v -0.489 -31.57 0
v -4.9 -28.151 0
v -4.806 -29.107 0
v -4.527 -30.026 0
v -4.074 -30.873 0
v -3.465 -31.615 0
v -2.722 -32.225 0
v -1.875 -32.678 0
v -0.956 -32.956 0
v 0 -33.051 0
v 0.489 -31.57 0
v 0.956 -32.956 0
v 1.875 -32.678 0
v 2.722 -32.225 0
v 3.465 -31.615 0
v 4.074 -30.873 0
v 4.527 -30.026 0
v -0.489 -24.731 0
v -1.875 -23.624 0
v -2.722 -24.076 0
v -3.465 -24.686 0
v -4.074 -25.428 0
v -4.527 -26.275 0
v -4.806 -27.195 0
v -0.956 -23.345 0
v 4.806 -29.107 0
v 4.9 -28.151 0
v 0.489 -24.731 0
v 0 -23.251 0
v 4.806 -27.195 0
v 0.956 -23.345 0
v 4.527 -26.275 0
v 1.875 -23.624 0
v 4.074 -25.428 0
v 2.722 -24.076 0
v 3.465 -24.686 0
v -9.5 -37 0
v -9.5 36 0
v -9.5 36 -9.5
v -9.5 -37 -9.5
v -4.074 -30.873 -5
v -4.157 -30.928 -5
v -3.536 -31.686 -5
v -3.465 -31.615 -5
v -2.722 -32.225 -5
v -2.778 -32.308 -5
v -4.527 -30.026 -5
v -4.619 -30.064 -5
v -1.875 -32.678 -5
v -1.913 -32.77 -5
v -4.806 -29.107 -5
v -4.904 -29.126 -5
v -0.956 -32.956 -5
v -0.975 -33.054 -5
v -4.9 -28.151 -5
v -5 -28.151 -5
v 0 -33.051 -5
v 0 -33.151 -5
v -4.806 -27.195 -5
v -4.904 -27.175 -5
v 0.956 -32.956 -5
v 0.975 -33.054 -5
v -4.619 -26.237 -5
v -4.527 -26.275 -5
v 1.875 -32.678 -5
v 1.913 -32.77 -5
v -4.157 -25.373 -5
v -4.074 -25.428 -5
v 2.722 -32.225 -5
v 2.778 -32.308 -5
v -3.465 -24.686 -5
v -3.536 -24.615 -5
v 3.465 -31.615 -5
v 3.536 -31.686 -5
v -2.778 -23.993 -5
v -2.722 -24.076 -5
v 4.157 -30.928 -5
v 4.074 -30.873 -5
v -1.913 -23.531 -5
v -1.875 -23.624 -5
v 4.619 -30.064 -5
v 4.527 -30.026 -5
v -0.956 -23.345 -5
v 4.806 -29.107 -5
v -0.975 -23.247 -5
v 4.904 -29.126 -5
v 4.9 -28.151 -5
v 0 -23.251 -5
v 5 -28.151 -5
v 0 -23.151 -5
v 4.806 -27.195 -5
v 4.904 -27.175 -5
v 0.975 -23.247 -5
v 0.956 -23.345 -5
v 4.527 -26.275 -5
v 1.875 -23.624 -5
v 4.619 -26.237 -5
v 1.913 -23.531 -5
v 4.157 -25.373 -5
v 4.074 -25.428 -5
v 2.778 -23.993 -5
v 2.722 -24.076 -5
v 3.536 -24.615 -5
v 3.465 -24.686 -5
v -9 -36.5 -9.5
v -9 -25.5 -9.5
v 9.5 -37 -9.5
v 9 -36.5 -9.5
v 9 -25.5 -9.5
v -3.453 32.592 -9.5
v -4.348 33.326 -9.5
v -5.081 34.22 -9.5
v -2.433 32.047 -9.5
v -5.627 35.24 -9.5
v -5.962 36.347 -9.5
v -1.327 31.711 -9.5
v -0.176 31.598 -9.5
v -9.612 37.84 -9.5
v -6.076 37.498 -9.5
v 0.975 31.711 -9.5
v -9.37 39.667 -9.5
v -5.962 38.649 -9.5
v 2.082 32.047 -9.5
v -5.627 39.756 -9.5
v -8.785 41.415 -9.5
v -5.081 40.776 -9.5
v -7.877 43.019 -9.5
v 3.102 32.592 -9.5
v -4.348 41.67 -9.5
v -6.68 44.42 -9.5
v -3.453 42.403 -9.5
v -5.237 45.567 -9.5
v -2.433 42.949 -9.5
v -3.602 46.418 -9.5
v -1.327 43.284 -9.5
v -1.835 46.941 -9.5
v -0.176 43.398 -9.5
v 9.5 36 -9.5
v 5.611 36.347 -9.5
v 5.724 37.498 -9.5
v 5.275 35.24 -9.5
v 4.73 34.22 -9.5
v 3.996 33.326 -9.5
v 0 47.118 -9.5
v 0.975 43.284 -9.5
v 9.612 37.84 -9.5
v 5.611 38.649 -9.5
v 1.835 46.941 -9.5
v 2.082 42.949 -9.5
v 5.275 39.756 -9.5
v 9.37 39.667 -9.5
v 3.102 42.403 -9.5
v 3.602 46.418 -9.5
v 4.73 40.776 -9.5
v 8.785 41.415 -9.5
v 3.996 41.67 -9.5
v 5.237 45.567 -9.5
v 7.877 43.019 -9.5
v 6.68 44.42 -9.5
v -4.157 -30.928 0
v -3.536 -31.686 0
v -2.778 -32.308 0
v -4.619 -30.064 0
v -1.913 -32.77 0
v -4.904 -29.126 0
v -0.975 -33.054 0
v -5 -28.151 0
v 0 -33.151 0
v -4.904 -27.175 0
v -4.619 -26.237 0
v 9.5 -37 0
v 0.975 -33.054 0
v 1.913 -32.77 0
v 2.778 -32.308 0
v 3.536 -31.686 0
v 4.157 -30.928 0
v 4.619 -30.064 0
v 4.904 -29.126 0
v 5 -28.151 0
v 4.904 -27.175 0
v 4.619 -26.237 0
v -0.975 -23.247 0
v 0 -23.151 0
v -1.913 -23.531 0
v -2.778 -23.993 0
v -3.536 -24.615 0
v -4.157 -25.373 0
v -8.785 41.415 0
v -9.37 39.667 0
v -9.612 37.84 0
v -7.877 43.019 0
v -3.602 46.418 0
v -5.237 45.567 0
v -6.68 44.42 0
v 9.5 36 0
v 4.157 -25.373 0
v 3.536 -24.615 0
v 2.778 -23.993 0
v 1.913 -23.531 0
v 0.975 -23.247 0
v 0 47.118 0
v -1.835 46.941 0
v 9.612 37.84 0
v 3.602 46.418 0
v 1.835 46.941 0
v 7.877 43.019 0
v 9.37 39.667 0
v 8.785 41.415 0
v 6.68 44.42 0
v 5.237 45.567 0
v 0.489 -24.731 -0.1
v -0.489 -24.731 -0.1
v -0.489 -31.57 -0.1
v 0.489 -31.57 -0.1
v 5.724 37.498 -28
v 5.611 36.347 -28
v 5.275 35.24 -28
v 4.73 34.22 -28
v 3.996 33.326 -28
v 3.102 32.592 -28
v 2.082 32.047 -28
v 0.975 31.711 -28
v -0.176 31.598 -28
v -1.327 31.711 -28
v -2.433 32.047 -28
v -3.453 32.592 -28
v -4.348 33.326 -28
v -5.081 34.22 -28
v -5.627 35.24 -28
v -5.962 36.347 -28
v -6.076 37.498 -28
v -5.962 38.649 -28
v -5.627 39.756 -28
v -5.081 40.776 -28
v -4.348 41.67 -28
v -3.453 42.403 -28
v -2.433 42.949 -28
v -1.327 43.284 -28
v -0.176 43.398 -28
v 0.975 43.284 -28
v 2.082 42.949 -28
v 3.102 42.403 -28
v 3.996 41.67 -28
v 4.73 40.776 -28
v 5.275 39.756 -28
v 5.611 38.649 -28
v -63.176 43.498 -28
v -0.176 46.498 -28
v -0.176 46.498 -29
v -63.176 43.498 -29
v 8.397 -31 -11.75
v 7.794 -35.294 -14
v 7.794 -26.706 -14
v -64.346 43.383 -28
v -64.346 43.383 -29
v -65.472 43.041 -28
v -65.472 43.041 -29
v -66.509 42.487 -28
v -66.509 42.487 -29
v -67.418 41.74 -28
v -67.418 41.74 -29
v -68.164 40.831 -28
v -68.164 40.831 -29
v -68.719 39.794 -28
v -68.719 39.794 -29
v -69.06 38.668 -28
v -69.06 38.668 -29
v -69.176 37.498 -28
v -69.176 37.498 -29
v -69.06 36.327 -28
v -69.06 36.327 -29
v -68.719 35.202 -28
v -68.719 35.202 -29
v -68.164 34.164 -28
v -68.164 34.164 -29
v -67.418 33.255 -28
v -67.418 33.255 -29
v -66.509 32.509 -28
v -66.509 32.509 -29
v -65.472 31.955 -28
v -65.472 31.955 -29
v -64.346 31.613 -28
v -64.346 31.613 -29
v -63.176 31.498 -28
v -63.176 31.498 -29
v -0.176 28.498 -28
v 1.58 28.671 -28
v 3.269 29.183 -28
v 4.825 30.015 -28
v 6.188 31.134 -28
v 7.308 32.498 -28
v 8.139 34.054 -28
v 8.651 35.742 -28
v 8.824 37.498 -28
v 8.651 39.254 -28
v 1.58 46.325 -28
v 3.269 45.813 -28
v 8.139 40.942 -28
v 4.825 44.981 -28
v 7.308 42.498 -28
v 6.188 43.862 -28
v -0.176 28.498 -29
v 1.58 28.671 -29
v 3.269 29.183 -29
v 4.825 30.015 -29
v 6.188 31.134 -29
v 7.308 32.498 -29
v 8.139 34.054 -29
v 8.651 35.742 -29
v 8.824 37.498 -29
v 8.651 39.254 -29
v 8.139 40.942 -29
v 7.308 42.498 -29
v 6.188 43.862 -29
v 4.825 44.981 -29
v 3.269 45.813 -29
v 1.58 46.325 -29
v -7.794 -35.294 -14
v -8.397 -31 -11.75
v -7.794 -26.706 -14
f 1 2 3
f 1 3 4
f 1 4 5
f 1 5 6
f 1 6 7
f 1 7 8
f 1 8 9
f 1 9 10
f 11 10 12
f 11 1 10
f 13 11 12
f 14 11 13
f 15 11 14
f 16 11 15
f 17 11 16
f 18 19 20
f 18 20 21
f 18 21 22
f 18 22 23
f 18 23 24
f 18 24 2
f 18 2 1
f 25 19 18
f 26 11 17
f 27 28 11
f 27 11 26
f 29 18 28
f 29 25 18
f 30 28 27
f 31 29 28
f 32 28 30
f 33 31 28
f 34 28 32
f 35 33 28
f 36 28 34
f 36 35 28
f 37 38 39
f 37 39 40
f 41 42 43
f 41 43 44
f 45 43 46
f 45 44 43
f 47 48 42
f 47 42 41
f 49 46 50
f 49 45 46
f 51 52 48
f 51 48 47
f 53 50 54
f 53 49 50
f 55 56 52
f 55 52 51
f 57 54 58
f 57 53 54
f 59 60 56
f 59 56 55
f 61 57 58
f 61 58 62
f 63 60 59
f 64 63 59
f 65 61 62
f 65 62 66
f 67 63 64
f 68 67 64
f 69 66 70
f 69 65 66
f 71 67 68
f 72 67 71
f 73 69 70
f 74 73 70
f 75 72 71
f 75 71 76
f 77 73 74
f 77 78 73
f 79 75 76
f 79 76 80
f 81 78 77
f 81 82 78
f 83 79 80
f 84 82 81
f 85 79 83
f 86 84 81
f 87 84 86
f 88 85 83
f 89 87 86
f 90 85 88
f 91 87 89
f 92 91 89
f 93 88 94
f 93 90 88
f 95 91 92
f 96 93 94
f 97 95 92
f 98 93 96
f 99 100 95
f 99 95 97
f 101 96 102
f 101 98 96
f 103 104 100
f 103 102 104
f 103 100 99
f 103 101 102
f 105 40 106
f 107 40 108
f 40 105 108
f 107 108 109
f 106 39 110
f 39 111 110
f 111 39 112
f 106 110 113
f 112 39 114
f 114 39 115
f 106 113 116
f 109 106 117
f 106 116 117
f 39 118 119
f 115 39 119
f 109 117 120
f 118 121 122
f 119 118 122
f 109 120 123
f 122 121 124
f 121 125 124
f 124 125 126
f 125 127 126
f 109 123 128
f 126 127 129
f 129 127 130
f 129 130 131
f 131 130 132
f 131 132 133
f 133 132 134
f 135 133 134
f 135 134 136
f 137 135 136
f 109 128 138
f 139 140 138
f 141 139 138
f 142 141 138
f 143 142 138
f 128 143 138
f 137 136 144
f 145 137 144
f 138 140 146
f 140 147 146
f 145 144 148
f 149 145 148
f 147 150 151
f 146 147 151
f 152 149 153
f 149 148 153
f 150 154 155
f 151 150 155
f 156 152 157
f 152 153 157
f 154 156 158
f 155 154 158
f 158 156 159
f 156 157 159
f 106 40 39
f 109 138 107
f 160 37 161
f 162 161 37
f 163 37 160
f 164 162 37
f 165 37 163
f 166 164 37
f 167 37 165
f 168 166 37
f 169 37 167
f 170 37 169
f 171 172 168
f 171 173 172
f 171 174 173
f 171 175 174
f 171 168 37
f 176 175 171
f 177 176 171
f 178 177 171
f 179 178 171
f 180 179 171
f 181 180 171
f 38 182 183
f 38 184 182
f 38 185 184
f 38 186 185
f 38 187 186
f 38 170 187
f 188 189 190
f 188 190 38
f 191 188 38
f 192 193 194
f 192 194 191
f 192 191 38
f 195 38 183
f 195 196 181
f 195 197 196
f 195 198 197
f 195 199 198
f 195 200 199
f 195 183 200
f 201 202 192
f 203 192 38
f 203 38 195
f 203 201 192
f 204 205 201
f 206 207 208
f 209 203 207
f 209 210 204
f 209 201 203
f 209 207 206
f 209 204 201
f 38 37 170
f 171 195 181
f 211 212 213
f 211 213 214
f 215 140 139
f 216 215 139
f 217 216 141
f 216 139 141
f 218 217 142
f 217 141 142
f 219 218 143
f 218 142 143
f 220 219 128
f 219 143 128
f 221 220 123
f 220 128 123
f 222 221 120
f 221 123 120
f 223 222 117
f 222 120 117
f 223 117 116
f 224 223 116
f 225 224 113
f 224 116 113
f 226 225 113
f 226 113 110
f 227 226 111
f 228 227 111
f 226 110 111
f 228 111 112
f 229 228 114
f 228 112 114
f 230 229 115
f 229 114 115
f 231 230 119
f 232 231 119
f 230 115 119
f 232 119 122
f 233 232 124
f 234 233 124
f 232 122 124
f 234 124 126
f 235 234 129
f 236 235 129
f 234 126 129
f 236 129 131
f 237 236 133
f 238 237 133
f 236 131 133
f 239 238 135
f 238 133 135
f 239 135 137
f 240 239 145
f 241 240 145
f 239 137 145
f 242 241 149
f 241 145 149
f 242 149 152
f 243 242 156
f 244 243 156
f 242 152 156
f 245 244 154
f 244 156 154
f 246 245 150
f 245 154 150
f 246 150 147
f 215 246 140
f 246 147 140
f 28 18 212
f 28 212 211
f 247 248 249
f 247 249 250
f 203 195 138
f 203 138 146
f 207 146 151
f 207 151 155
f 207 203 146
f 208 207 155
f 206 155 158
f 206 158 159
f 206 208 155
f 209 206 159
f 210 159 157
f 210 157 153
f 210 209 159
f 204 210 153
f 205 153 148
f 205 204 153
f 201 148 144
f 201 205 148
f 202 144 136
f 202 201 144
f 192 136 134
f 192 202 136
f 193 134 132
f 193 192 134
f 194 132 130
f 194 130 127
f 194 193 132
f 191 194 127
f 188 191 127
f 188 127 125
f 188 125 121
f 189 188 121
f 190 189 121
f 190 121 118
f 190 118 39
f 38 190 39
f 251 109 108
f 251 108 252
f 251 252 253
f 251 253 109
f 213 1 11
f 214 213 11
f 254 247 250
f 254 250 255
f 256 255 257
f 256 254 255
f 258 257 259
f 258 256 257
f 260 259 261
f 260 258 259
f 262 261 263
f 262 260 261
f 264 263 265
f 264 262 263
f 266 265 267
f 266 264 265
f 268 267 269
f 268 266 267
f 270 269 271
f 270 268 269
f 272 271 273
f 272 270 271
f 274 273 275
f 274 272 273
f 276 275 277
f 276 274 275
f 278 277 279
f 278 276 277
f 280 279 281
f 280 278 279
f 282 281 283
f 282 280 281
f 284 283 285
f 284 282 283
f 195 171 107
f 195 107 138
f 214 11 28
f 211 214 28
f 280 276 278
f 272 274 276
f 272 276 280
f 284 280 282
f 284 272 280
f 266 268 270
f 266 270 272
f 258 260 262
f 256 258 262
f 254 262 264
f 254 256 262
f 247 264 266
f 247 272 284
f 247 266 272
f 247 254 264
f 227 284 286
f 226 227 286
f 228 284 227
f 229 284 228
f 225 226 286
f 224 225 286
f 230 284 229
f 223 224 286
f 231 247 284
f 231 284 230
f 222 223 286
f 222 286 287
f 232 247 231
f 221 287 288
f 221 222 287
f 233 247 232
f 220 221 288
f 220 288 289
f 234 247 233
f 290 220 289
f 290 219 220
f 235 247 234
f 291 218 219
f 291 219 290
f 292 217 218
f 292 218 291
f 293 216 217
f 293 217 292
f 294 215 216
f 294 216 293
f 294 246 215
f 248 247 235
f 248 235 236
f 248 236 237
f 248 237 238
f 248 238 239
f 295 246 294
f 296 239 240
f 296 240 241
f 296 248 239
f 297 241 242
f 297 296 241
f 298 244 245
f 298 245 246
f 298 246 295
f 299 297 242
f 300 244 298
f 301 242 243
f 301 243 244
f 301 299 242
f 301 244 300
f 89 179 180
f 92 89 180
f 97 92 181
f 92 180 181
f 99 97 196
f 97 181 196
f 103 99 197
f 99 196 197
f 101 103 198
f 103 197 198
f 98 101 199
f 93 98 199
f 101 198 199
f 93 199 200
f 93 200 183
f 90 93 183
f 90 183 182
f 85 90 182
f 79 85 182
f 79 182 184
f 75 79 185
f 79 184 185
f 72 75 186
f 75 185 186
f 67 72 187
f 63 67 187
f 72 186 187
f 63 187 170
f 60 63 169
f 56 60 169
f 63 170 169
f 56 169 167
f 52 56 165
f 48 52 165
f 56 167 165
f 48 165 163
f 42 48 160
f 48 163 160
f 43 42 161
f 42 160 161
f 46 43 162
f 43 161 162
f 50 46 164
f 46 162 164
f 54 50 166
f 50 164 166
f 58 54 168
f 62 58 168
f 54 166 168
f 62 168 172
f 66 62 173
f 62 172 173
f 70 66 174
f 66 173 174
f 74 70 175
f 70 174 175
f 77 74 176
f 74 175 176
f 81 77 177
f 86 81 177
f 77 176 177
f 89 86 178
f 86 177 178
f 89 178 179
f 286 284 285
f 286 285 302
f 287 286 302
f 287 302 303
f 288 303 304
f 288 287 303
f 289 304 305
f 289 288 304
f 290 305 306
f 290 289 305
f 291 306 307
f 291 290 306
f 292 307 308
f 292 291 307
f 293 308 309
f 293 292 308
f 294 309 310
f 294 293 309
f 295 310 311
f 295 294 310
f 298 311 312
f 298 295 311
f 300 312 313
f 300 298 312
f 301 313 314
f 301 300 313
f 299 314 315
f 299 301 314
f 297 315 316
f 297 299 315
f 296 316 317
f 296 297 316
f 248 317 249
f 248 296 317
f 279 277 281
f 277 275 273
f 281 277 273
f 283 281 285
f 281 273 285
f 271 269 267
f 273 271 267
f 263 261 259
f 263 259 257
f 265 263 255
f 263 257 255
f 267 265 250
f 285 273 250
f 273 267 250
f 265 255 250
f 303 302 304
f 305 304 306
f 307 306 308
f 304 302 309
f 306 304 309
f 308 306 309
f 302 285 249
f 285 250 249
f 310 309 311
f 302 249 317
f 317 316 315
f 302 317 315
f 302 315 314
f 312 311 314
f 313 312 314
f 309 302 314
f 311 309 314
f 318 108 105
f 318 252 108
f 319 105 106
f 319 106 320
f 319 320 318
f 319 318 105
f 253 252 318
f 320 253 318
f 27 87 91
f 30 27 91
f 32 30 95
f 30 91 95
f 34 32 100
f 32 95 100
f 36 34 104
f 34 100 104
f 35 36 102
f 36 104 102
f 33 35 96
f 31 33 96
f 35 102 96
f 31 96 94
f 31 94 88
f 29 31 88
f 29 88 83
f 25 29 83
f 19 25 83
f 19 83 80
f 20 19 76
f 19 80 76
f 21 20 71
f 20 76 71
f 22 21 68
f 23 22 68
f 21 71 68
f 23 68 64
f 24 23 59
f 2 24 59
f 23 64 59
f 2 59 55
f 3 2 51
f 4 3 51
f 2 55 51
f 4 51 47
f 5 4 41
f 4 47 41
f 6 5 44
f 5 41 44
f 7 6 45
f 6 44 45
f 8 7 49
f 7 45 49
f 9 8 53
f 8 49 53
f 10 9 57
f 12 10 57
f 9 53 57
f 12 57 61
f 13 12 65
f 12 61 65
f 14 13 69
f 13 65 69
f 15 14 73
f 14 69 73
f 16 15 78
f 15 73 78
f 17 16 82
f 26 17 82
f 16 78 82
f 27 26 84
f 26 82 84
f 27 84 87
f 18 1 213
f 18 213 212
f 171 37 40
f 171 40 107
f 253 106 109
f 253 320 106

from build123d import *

# Parameters (mm, degrees)
EXTRUDE_1_DEPTH     = 9.5
SKETCH_2_W          = 18
SKETCH_2_H          = 11
EXTRUDE_2_DEPTH     = 4.5
EXTRUDE_2_TAPER     = 15
SKETCH_3_R          = 5
CUT_EXTRUDE_1_DEPTH = 5
SKETCH_4_R          = 4.9
EXTRUDE_3_DEPTH     = 5
SKETCH_5_W          = 0.978234864
SKETCH_5_H          = 6.839106706
CUT_EXTRUDE_2_DEPTH = 0.1
SKETCH_7_R          = 5.9
EXTRUDE_4_DEPTH     = 18.5
EXTRUDE_5_DEPTH     = 1


with BuildPart() as part:
    # 草圖1 → 伸長1 (new body)
    with BuildSketch(Plane.XY):
        with BuildLine():
            Line((-9.5, 36), (-9.5, -37))
            Line((-9.5, -37), (9.5, -37))
            Line((9.5, -37), (9.5, 36))
            ThreePointArc((9.5, 36), (0, 47.117692031), (-9.5, 36))
        make_face()
    extrude(amount=-EXTRUDE_1_DEPTH)

    # 草圖2 → 伸長2 (add)
    with BuildSketch(Plane(origin=(0, 0, -9.5), x_dir=(-1, 0, 0), z_dir=(0, 0, -1))):
        with Locations((0, -31)):
            Rectangle(SKETCH_2_W, SKETCH_2_H)
    extrude(amount=EXTRUDE_2_DEPTH, taper=EXTRUDE_2_TAPER)

    # 草圖3 → 除料-伸長1 (cut)
    with BuildSketch(Plane.XY):
        with Locations((0, -28.150570544)):
            Circle(SKETCH_3_R)
    extrude(amount=-CUT_EXTRUDE_1_DEPTH, mode=Mode.SUBTRACT)

    # 草圖4 → 伸長3 (add)
    with BuildSketch(Plane.XY.offset(-5)):
        with Locations((0, -28.150570544)):
            Circle(SKETCH_4_R)
    extrude(amount=EXTRUDE_3_DEPTH)

    # 草圖5 → 除料-伸長2 (cut)
    with BuildSketch(Plane.XY):
        with Locations((0, -28.150570544)):
            Rectangle(SKETCH_5_W, SKETCH_5_H)
    extrude(amount=-CUT_EXTRUDE_2_DEPTH, mode=Mode.SUBTRACT)

    # 草圖7 → 伸長4 (add)
    with BuildSketch(Plane(origin=(0, 0, -9.5), x_dir=(-1, 0, 0), z_dir=(0, 0, -1))):
        with Locations(Location((0.17562961, 37.497796385, 0), (0, 0, 180))):
            Circle(SKETCH_7_R)
    extrude(amount=EXTRUDE_4_DEPTH)

    # 草圖8 → 伸長5 (add)
    with BuildSketch(Plane(origin=(0, 0, -28), x_dir=(-1, 0, 0), z_dir=(0, 0, -1))):
        with BuildLine():
            Line((0.17562961, 46.497796385), (63.17562961, 43.497796385))
            ThreePointArc((63.17562961, 43.497796385), (69.17562961, 37.497796385), (63.17562961, 31.497796385))
            Line((63.17562961, 31.497796385), (0.17562961, 28.497796385))
            ThreePointArc((0.17562961, 28.497796385), (-8.82437039, 37.497796385), (0.17562961, 46.497796385))
        make_face()
    extrude(amount=EXTRUDE_5_DEPTH)


solid = part.part
